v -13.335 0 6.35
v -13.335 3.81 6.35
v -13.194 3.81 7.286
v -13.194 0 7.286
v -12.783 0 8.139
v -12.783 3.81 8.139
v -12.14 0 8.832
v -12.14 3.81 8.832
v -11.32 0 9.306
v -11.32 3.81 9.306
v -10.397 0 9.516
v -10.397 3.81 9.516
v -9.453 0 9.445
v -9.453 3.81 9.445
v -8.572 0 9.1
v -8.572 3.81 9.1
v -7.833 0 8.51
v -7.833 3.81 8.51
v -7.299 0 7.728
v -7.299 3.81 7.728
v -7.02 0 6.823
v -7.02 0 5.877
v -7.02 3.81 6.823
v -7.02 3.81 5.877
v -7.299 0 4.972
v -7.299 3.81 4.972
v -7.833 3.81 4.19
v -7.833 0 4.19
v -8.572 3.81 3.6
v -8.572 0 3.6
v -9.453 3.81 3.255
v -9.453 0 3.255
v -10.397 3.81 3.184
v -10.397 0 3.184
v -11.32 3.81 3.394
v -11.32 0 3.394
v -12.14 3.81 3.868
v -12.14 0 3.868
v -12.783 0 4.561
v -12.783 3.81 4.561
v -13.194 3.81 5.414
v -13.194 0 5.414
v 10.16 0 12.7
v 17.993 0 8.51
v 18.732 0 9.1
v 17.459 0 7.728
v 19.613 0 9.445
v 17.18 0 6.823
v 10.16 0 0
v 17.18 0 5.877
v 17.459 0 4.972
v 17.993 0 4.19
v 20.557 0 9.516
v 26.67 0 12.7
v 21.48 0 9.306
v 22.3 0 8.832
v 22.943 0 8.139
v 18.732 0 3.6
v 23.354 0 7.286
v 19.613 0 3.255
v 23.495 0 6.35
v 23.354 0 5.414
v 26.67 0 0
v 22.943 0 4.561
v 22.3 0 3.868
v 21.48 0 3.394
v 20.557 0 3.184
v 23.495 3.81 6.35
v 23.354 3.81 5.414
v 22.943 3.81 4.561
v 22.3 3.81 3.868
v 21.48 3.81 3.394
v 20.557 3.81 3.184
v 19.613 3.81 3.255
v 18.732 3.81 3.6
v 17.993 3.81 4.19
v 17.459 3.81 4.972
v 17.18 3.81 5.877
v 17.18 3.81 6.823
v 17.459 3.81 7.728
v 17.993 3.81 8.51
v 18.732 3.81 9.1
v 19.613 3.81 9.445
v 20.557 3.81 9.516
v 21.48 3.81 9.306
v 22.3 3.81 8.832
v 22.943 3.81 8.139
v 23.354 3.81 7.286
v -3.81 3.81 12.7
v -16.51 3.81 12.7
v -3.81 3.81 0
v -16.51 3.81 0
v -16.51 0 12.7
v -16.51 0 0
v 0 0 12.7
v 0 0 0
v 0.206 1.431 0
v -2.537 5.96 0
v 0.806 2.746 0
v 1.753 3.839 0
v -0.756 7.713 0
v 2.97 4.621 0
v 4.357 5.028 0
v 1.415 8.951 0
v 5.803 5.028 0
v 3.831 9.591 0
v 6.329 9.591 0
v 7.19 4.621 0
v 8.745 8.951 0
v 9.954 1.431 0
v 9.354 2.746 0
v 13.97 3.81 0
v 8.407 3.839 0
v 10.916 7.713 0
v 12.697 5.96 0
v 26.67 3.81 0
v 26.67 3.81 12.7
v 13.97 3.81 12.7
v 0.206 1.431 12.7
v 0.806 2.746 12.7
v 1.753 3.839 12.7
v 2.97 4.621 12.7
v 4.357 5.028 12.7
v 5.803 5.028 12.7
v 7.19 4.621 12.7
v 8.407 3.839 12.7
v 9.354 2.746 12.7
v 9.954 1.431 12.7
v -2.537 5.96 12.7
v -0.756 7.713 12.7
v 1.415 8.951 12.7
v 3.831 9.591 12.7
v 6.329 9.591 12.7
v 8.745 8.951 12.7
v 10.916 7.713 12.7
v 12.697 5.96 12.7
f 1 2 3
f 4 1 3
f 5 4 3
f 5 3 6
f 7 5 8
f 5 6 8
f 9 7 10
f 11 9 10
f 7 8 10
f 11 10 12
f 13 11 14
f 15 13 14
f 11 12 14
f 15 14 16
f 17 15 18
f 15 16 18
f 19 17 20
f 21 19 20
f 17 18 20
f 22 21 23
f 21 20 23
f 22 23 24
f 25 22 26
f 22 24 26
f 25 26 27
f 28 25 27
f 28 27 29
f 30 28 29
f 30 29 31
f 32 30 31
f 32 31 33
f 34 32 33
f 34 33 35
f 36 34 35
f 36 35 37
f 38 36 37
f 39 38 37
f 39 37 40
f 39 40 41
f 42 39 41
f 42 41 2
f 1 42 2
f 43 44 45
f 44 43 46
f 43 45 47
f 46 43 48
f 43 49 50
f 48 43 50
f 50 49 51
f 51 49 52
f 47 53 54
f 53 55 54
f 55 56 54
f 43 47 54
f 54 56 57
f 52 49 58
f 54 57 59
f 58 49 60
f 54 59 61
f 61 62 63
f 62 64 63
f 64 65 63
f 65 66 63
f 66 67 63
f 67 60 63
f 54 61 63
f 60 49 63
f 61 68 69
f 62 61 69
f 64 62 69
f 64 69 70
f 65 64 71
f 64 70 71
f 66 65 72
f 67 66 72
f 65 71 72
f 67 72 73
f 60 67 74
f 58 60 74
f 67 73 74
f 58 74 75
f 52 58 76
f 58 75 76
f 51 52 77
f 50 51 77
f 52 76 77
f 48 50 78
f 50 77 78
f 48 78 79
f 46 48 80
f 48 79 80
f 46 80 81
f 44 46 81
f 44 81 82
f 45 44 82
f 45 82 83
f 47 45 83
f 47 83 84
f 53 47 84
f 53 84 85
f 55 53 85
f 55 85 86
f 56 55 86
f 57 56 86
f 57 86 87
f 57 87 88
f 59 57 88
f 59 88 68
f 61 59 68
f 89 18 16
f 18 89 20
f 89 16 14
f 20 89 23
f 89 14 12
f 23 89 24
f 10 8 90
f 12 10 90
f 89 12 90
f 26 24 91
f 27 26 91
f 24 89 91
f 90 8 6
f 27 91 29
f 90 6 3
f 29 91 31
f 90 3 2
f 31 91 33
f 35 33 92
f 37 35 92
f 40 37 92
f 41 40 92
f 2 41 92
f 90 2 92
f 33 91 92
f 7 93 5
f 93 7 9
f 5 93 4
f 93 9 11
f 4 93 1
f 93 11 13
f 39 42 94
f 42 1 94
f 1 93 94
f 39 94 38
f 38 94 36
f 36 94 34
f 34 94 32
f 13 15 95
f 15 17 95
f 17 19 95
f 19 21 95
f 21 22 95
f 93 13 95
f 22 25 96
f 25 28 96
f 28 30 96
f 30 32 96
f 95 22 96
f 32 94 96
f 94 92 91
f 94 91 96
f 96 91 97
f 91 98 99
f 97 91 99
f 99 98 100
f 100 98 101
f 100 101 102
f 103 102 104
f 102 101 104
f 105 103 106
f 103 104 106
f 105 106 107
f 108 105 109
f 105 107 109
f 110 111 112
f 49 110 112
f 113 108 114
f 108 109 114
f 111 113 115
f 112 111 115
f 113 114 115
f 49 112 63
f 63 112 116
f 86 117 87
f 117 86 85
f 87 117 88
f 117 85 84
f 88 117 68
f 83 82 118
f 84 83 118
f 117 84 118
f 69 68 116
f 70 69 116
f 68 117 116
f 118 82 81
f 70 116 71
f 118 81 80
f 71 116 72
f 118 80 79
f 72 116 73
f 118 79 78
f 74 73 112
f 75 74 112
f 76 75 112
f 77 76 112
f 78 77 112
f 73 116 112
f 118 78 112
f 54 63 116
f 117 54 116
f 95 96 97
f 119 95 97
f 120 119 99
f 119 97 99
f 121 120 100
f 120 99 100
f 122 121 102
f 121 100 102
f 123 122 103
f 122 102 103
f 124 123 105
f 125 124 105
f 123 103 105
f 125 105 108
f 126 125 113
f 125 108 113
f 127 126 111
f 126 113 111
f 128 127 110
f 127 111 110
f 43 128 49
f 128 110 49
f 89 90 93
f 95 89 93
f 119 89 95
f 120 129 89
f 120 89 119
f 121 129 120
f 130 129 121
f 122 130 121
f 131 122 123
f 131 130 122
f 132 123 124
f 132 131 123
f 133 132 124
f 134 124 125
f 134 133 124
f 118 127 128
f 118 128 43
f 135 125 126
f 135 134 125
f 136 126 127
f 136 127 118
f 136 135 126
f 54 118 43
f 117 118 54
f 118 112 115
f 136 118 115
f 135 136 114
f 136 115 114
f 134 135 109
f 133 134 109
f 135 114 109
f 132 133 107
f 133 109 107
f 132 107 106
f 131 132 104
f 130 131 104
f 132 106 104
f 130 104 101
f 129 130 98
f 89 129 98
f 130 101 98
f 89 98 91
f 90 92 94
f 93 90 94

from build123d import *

# Parameters (mm, degrees)
BOSS_EXTRUDE1_DEPTH = 12.7
SKETCH2_R           = 3.175
CUT_EXTRUDE1_DEPTH  = 31.115483017


with BuildPart() as part:
    # Sketch1 → Boss-Extrude1 (new body)
    with BuildSketch(Plane.XY):
        with BuildLine():
            Line((-3.81, 3.81), (-16.51, 3.81))
            Line((-16.51, 3.81), (-16.51, 0))
            Line((-16.51, 0), (0, 0))
            ThreePointArc((0, 0), (5.08, 5.08), (10.16, 0))
            Line((10.16, 0), (26.67, 0))
            Line((26.67, 0), (26.67, 3.81))
            Line((26.67, 3.81), (13.97, 3.81))
            ThreePointArc((13.97, 3.81), (5.08, 9.672031844), (-3.81, 3.81))
        make_face()
    extrude(amount=BOSS_EXTRUDE1_DEPTH)

    # Sketch2 → Cut-Extrude1 (cut, through all)
    with BuildSketch(Plane(origin=(0, 3.81, 0), x_dir=(1, 0, 0), z_dir=(0, 1, 0))):
        with Locations(Location((-10.16, -6.35, 0), (0, 0, 180))):
            Circle(SKETCH2_R)
        with Locations((20.32, -6.35)):
            Circle(SKETCH2_R)
    extrude(amount=-CUT_EXTRUDE1_DEPTH, mode=Mode.SUBTRACT)


solid = part.part
